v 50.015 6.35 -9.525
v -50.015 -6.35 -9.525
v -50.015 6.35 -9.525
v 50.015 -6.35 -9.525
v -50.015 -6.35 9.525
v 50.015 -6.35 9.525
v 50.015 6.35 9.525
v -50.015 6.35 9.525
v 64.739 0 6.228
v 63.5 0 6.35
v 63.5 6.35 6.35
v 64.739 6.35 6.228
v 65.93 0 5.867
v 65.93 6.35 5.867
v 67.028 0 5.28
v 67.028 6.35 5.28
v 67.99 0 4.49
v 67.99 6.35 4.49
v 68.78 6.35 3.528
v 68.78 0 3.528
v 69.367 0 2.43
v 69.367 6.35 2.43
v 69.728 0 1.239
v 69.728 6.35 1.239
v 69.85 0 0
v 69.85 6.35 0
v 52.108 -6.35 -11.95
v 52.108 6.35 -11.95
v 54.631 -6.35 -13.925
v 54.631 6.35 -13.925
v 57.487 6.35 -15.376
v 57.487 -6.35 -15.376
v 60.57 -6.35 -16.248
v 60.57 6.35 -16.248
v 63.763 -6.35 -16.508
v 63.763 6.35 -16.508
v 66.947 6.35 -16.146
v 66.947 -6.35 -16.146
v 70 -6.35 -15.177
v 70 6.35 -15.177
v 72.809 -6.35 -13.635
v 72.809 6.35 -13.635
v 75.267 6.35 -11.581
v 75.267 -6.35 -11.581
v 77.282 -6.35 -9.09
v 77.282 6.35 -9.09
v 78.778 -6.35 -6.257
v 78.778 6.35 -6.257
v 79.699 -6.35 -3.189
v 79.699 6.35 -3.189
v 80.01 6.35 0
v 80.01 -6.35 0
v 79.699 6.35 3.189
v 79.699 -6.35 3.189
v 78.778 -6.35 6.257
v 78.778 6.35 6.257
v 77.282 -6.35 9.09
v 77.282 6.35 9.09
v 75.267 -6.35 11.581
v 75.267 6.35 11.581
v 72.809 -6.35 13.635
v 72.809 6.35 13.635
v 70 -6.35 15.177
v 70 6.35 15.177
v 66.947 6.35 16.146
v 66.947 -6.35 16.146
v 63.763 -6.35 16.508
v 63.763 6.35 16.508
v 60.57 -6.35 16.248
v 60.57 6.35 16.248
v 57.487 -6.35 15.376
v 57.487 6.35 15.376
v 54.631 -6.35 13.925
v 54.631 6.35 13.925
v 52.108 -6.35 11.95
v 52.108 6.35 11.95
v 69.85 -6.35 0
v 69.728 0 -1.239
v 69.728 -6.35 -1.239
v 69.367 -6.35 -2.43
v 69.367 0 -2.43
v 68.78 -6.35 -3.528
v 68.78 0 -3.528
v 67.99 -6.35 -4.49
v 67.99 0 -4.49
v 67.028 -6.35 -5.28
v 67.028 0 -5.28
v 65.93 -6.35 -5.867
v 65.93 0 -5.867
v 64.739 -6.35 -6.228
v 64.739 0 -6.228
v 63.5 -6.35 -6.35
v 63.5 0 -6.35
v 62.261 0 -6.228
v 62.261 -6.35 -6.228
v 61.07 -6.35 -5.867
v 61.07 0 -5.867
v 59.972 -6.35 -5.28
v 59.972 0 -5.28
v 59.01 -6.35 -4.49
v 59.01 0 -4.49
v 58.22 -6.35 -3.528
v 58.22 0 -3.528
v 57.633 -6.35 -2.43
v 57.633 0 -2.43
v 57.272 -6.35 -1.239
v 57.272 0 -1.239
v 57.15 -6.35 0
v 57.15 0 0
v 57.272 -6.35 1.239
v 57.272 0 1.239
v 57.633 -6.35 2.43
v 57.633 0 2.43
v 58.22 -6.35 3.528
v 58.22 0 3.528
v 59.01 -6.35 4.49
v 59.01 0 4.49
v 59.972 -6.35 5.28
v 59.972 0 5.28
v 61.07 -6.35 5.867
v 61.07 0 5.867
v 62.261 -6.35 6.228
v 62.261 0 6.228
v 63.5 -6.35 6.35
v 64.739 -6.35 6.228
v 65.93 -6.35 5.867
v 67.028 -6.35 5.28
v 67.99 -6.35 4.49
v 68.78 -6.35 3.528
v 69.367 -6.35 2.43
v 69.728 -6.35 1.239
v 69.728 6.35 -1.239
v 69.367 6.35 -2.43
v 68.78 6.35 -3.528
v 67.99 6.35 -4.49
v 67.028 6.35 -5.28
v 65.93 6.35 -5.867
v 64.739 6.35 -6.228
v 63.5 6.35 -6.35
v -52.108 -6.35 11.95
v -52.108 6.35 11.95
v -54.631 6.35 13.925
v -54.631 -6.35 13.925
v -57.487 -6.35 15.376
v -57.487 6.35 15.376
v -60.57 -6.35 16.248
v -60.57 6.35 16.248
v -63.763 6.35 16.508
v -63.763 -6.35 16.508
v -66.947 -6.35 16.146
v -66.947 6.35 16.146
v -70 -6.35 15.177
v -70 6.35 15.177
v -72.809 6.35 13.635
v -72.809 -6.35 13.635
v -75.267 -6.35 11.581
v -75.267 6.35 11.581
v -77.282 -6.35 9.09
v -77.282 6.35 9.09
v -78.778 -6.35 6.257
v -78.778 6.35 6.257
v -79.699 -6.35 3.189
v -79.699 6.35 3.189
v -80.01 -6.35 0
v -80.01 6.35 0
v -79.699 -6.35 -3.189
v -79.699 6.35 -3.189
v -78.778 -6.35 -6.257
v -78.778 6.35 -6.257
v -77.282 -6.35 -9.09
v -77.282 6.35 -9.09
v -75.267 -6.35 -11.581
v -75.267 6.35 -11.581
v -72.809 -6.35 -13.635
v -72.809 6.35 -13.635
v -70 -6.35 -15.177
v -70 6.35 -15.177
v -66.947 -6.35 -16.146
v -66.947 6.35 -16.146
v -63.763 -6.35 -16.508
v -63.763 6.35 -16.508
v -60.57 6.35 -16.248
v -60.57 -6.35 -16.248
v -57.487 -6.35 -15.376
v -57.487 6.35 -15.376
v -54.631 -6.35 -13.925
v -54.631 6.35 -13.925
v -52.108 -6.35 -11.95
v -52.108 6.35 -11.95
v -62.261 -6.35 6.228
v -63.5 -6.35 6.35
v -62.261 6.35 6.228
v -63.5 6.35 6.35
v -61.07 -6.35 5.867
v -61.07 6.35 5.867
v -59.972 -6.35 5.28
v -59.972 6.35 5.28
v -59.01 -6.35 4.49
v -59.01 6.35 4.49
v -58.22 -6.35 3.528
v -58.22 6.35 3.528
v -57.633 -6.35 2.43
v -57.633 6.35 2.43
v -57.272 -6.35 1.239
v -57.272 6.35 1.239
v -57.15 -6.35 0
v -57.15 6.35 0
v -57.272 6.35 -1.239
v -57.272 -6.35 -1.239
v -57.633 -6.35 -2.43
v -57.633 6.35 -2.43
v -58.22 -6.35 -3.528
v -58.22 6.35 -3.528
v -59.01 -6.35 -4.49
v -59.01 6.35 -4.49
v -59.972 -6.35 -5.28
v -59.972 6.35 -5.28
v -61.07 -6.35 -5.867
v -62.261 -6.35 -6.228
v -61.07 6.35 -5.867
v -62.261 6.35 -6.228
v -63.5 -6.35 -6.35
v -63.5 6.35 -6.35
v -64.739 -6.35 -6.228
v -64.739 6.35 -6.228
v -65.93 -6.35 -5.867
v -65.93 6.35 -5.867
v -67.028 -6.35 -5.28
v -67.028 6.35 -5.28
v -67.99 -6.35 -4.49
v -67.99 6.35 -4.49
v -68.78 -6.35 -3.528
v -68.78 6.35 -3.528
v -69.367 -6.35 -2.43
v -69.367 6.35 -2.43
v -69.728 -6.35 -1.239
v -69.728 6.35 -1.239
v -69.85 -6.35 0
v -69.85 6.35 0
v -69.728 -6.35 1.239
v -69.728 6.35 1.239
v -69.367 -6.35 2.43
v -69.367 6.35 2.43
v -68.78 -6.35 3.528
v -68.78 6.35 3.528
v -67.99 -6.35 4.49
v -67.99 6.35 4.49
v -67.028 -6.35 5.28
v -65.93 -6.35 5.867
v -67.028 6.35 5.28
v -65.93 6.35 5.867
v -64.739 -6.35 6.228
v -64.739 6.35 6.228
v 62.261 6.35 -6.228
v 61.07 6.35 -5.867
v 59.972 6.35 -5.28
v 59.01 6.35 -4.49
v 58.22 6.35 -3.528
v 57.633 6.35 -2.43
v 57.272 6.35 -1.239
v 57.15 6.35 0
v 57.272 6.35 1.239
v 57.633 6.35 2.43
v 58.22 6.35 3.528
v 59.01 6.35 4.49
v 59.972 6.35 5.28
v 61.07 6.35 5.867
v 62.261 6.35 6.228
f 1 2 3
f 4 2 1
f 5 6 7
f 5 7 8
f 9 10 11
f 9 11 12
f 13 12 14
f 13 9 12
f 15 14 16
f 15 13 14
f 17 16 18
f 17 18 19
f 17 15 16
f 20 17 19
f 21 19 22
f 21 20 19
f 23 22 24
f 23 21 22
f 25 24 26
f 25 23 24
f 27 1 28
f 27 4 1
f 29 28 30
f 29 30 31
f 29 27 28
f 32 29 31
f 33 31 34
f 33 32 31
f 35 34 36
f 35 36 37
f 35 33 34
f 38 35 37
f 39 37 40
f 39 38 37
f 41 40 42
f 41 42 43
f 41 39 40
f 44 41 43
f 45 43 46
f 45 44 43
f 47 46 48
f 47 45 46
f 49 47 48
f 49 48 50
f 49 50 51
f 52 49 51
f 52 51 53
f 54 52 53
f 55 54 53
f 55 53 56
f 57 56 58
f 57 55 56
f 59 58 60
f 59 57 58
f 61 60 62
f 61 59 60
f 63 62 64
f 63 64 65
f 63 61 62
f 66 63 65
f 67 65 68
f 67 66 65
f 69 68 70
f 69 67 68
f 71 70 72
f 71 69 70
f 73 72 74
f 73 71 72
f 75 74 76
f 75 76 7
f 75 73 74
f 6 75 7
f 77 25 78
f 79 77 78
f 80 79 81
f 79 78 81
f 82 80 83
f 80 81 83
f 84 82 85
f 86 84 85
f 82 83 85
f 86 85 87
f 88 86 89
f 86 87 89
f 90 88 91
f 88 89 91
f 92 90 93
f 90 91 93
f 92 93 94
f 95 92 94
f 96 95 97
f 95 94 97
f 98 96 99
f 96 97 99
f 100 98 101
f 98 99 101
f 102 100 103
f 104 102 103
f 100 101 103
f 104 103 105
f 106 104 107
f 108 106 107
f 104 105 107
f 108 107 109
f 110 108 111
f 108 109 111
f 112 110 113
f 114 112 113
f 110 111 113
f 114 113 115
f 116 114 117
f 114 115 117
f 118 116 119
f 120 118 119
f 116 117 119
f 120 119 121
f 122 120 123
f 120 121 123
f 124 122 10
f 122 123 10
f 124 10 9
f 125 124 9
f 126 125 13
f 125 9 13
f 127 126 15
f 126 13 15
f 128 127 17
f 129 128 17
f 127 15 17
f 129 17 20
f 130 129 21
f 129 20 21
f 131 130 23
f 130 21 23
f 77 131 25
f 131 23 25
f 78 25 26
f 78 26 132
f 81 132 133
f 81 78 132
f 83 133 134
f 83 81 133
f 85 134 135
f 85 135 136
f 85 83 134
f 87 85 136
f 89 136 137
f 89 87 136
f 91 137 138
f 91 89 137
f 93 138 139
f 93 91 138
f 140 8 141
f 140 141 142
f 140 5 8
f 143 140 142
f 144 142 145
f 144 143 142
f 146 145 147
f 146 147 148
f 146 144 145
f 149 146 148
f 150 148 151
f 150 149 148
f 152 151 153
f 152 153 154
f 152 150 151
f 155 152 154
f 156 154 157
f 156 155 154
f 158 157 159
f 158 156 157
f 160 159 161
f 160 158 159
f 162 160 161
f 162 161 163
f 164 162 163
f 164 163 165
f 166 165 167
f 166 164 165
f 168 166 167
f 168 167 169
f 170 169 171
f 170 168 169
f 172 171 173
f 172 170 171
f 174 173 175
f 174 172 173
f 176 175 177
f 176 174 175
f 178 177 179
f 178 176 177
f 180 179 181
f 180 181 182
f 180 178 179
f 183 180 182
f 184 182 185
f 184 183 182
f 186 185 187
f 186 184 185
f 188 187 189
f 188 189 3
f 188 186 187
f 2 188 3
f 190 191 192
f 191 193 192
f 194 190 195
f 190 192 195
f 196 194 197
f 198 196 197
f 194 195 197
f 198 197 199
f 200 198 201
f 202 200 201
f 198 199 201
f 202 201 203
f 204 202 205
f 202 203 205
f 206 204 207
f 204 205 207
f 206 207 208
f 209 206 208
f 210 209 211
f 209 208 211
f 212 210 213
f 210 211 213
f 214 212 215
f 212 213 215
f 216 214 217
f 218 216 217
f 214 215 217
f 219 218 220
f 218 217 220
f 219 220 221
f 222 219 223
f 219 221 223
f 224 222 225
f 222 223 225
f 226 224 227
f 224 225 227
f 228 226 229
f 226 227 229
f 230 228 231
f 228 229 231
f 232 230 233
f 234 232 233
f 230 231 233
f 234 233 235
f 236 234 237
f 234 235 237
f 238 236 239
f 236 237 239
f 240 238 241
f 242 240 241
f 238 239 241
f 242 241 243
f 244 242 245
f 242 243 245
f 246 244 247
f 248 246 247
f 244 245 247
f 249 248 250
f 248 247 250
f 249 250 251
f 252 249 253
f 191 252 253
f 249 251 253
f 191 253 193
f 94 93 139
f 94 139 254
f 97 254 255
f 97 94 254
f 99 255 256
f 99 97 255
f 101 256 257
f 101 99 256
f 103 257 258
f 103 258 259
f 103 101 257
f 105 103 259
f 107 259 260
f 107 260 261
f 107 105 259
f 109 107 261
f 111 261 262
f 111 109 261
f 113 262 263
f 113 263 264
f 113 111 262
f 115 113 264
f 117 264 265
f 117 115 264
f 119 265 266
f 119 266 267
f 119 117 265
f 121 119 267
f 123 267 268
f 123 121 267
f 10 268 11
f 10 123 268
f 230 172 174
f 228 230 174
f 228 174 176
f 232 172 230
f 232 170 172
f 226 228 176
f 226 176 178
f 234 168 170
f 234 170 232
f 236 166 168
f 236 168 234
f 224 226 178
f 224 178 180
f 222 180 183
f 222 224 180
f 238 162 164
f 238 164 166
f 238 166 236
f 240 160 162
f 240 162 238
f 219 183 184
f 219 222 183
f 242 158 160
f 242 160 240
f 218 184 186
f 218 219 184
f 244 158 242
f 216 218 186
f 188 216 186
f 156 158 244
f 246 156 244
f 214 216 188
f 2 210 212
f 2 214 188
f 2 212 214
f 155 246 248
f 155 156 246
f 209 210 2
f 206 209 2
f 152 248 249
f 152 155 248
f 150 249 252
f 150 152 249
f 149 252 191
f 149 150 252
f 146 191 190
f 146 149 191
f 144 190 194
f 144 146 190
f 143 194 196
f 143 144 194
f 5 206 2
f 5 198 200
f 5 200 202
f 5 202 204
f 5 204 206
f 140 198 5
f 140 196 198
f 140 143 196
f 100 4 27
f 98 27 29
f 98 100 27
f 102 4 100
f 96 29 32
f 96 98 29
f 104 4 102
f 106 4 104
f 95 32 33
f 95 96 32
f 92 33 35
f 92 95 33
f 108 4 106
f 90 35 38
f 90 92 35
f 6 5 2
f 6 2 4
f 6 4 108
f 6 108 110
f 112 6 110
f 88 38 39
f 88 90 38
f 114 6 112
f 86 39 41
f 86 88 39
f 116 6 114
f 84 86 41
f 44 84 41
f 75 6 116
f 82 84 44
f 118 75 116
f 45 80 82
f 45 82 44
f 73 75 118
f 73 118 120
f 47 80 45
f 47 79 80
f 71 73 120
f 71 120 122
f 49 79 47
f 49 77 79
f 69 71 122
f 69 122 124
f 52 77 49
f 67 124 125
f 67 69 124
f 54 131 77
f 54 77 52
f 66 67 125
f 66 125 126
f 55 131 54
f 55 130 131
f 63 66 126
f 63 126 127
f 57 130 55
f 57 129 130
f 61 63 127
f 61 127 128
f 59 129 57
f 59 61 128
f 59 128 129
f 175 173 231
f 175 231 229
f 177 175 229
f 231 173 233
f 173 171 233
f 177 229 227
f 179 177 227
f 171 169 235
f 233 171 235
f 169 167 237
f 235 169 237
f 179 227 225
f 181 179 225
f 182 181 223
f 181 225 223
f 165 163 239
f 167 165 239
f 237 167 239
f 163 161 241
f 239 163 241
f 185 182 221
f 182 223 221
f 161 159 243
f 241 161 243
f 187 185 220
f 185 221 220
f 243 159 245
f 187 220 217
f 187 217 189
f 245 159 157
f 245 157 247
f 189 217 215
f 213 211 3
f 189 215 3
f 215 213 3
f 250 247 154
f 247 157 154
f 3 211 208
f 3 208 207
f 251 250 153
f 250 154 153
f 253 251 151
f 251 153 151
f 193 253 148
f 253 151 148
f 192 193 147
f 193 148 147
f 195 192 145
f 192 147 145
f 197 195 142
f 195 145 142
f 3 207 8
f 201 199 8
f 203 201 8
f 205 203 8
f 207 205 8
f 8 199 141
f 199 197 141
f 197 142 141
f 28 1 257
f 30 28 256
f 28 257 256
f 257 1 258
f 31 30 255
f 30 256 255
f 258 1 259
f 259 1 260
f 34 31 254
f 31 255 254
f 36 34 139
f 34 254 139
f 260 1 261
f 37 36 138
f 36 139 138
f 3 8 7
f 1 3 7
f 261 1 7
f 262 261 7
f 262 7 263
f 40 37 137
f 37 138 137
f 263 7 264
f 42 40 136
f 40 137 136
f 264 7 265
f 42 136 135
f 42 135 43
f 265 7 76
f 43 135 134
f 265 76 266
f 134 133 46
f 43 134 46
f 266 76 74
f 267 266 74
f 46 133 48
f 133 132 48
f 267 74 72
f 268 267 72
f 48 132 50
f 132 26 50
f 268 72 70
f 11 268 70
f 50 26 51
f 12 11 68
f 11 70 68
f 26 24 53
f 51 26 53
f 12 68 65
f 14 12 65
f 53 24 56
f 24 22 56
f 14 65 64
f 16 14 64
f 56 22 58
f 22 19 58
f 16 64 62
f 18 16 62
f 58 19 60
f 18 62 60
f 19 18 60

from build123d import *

# Parameters (mm, degrees)
F1_DEPTH = 6.35


with BuildPart() as f1:
    # F0 (on Front) → F1 (new body, symmetric)
    with BuildSketch(Plane.XZ):
        with BuildLine():
            Line((63.5, -6.35), (63.5, -9.525))
            Line((63.5, -9.525), (50.0146570307, -9.525))
            ThreePointArc((50.0146570307, -9.525), (68.4968533887, -15.7356778123), (80.01, 0))
            ThreePointArc((80.01, 0), (68.4968533887, 15.7356778123), (50.0146570307, 9.525))
            Line((50.0146570307, 9.525), (63.5, 9.525))
            Line((63.5, 9.525), (63.5, 6.35))
            ThreePointArc((63.5, 6.35), (67.9901280605, 4.4901280605), (69.85, 0))
            ThreePointArc((69.85, 0), (67.9901280605, -4.4901280605), (63.5, -6.35))
        make_face()
        with BuildLine():
            Line((50.0146570307, -9.525), (63.5, -9.525))
            Line((63.5, -9.525), (63.5, -6.35))
            ThreePointArc((63.5, -6.35), (57.15, 0), (63.5, 6.35))
            Line((63.5, 6.35), (63.5, 9.525))
            Line((63.5, 9.525), (50.0146570307, 9.525))
            ThreePointArc((50.0146570307, 9.525), (46.99, 0), (50.0146570307, -9.525))
        make_face()
        with BuildLine():
            Line((-50.0146570307, -9.525), (50.0146570307, -9.525))
            ThreePointArc((50.0146570307, -9.525), (46.99, 0), (50.0146570307, 9.525))
            Line((50.0146570307, 9.525), (-50.0146570307, 9.525))
            ThreePointArc((-50.0146570307, 9.525), (-47.7643221877, 4.9968533887), (-46.99, 0))
            ThreePointArc((-46.99, 0), (-47.7643221877, -4.9968533887), (-50.0146570307, -9.525))
        make_face()
        with BuildLine():
            ThreePointArc((-50.0146570307, 9.525), (-80.01, 0), (-50.0146570307, -9.525))
            Line((-50.0146570307, -9.525), (-63.5, -9.525))
            Line((-63.5, -9.525), (-63.5, -6.35))
            ThreePointArc((-63.5, -6.35), (-69.85, 0), (-63.5, 6.35))
            Line((-63.5, 6.35), (-63.5, 9.525))
            Line((-63.5, 9.525), (-50.0146570307, 9.525))
        make_face()
        with BuildLine():
            Line((-63.5, -9.525), (-50.0146570307, -9.525))
            ThreePointArc((-50.0146570307, -9.525), (-47.7643221877, -4.9968533887), (-46.99, 0))
            ThreePointArc((-46.99, 0), (-47.7643221877, 4.9968533887), (-50.0146570307, 9.525))
            Line((-50.0146570307, 9.525), (-63.5, 9.525))
            Line((-63.5, 9.525), (-63.5, 6.35))
            ThreePointArc((-63.5, 6.35), (-59.0098719395, 4.4901280605), (-57.15, 0))
            ThreePointArc((-57.15, 0), (-59.0098719395, -4.4901280605), (-63.5, -6.35))
            Line((-63.5, -6.35), (-63.5, -9.525))
        make_face()
    extrude(amount=F1_DEPTH, both=True)


solid = f1.part
